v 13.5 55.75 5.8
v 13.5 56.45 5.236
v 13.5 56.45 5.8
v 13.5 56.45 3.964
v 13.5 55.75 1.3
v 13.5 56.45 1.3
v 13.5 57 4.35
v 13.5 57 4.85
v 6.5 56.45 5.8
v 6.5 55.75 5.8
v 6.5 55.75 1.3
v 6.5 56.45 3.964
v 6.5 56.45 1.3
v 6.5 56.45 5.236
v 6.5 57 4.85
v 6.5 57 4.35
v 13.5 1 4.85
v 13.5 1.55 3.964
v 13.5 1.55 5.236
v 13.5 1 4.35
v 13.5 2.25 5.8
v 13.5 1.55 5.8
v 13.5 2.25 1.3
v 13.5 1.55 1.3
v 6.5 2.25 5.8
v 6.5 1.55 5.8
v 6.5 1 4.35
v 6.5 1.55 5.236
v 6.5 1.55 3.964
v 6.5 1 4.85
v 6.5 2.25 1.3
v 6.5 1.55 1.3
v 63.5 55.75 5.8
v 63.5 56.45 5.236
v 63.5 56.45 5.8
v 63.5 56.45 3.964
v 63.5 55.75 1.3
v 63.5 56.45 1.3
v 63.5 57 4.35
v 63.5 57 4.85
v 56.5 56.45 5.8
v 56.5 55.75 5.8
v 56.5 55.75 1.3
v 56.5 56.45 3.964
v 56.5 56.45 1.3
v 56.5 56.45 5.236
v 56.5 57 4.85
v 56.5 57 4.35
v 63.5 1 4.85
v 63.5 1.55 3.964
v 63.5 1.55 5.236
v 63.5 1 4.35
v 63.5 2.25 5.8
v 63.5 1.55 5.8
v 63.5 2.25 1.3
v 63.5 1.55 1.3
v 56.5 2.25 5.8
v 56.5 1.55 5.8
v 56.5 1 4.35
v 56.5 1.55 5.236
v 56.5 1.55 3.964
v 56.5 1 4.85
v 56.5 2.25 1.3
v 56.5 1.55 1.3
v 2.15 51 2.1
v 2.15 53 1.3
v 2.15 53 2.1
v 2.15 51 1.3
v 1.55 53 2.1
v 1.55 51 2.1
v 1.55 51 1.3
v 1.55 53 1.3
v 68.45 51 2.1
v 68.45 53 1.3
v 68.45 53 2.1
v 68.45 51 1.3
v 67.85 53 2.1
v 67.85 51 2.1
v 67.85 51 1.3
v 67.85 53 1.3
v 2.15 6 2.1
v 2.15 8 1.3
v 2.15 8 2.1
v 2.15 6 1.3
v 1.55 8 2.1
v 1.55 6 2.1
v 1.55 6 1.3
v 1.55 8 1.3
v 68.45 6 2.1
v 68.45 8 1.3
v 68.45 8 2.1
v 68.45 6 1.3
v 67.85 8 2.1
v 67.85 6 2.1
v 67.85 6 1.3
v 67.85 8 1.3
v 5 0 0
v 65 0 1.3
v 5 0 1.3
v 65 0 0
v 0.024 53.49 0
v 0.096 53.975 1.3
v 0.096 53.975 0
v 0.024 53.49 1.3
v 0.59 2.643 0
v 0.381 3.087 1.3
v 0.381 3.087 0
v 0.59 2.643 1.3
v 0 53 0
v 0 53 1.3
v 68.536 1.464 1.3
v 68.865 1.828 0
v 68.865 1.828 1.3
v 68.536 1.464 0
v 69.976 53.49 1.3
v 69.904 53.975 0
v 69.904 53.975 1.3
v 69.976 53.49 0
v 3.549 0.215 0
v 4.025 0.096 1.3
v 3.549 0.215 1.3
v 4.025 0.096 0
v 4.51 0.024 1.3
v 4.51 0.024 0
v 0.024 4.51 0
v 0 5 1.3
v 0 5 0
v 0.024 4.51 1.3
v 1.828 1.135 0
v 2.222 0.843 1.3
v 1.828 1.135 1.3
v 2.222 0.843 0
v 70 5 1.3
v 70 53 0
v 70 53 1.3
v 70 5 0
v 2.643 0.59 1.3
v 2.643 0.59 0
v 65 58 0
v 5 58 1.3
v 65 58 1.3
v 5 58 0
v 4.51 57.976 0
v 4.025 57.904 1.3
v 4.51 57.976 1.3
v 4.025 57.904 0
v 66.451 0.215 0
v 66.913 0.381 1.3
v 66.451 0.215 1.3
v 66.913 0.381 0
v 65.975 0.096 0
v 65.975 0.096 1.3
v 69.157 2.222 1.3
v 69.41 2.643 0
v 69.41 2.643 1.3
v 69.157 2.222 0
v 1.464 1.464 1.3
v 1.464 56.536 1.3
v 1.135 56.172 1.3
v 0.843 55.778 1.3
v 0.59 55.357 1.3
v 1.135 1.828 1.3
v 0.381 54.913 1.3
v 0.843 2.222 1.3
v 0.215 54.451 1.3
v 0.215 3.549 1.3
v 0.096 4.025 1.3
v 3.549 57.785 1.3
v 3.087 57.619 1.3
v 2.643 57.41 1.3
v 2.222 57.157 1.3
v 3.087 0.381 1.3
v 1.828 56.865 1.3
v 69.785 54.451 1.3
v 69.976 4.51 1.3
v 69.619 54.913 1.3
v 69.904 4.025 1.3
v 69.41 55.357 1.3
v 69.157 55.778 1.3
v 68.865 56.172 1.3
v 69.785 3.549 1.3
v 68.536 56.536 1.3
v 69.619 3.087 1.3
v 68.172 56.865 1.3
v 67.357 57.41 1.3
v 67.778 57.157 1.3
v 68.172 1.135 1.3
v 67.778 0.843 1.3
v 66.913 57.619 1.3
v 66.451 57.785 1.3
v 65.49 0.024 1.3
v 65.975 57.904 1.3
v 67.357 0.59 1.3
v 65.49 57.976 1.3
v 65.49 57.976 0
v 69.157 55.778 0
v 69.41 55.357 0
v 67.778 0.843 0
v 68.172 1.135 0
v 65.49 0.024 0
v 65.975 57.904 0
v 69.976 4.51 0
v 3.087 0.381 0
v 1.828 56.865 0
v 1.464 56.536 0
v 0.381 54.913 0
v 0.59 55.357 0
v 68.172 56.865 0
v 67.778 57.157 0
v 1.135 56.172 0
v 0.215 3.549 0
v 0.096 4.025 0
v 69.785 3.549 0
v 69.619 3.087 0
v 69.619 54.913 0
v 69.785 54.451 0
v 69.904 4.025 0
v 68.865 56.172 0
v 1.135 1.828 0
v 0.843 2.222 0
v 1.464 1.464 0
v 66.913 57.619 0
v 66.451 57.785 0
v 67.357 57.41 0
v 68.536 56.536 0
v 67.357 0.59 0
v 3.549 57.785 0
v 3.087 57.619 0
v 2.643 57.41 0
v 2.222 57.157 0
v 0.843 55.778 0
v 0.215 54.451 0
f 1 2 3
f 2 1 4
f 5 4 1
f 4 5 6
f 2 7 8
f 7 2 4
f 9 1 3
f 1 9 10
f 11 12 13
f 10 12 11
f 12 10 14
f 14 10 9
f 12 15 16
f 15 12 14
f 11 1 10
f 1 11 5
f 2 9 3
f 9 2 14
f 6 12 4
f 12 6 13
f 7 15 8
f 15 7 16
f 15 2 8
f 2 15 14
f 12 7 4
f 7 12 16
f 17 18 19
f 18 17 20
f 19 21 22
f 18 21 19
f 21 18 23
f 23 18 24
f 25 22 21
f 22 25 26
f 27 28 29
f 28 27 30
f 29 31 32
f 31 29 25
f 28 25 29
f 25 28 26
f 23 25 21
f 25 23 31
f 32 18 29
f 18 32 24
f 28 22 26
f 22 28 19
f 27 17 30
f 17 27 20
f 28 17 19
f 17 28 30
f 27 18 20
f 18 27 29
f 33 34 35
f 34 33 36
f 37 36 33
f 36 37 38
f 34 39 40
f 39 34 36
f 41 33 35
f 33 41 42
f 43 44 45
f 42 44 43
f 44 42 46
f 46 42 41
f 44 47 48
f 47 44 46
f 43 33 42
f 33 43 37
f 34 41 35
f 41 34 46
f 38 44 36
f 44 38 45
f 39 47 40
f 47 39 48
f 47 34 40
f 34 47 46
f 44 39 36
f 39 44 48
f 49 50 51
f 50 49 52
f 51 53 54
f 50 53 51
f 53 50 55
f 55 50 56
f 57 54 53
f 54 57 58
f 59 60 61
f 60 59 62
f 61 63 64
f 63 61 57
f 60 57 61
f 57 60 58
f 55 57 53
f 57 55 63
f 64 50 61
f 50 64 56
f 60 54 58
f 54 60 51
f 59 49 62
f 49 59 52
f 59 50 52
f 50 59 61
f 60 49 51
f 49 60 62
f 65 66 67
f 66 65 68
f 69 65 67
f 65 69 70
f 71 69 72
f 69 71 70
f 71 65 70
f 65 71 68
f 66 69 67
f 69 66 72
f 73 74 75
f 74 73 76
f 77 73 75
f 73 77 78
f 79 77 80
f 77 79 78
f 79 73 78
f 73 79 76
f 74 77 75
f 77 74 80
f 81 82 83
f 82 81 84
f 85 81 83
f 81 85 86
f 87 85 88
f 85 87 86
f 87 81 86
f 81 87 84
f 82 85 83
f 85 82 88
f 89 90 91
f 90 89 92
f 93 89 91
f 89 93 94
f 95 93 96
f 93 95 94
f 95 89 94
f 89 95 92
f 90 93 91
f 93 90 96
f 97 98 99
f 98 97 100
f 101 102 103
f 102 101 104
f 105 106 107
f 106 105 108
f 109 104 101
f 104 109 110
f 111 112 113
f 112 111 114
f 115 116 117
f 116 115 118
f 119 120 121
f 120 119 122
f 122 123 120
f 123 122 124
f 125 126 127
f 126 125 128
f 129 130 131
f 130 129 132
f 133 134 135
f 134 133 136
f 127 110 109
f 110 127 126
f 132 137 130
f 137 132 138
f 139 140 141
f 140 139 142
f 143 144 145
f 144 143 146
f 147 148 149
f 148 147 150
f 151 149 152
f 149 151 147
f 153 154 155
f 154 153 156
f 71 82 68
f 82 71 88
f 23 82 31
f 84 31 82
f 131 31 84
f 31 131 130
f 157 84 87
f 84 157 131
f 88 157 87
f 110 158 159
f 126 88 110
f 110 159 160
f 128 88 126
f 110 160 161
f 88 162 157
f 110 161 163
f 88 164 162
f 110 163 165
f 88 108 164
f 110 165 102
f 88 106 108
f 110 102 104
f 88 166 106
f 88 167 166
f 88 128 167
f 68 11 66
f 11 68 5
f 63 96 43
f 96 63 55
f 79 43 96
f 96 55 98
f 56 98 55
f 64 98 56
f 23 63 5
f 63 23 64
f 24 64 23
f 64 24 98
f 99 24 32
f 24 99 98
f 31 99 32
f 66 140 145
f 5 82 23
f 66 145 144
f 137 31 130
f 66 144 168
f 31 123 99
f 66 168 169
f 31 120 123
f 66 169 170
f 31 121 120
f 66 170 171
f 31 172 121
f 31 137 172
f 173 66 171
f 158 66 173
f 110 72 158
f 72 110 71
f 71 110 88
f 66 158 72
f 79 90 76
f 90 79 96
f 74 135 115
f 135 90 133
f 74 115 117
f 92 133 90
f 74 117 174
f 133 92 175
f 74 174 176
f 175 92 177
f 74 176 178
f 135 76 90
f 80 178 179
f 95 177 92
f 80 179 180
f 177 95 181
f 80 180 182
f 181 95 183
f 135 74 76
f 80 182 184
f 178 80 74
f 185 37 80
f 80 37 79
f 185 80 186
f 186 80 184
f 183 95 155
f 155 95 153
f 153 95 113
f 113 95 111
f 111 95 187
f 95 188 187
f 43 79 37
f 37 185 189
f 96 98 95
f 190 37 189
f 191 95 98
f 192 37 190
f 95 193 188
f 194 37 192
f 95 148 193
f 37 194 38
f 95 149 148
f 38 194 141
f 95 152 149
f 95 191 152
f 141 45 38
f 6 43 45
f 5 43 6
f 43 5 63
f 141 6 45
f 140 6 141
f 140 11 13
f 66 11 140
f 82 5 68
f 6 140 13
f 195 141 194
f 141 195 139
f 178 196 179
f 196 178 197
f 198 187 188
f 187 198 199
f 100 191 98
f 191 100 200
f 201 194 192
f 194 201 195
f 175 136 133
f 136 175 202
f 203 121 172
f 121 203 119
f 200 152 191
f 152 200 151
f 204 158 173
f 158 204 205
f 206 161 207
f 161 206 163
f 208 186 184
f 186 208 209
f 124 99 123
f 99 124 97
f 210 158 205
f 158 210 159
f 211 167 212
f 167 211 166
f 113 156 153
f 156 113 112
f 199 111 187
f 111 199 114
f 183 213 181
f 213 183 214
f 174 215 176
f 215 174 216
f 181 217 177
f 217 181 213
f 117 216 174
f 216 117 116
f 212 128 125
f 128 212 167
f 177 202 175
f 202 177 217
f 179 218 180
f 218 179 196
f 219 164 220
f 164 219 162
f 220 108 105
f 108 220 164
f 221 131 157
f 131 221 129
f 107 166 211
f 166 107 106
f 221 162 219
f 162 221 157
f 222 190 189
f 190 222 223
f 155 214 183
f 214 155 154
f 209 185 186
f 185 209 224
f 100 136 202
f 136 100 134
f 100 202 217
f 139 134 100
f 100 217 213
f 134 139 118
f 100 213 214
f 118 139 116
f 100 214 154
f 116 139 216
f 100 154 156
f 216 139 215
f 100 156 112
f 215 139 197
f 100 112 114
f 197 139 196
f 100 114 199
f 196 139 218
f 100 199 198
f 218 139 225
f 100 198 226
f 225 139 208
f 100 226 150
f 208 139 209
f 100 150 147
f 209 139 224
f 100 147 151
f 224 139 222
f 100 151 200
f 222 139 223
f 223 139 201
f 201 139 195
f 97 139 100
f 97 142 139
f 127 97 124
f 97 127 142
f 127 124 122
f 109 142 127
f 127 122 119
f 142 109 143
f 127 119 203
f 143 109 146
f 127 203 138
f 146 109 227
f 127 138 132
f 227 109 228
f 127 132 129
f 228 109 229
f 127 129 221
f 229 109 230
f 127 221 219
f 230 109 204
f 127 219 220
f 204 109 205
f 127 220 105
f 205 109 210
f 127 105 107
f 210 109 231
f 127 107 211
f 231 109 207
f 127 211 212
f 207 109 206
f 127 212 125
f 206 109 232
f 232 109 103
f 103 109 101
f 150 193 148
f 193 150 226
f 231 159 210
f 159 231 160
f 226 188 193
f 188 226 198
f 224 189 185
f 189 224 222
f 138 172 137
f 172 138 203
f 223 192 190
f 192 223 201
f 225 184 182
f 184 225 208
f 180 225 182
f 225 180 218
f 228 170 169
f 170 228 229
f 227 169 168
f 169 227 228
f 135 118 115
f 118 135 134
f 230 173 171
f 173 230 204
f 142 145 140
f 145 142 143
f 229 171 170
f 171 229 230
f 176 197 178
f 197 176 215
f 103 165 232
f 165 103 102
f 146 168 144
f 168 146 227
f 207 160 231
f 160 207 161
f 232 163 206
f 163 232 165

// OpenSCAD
// Spine Smart v3 — revised prototype for stage I.
// Nominal component envelopes from Sizes-1.pdf, not measured purchased parts.
// Units: mm. Print bottom and lid separately; do not print assembled view.
$fn=64;
mode=2; // 0 assembled, 1 bottom, 2 lid on bed, 3 exploded, 4 component plan
L=70; W=58; H=9.6;
wall=1.3; floor_t=1.3; lid_t=1.3; base_h=H-lid_t; corner=5;
clip_x=[10,60]; clip_width=7; clip_t=0.7; clip_gap=0.25;
clip_length=4.5; catch_depth=0.30;
// Adjustable connector openings: verify alignment with actual modules.
charge_x=41.75; esp_usb_x=41; usb_width=12; usb_height=5; usb_z=2.0;
switch_x=18; switch_slot_w=11; switch_slot_h=3.5; switch_z=3.0;

module rounded_box(l,w,h,r) {
    linear_extrude(height=h)
        hull() for(x=[r,l-r],y=[r,w-r]) translate([x,y]) circle(r=r);
}

module board_seat(x,y,w,l,front_open=false,back_open=false) {
    // Adhesive seat, not an unverified screw-hole pattern.
    translate([x,y,floor_t-0.02]) cube([w,l,0.62]);
    translate([x-0.65,y+2,floor_t-0.02]) cube([0.55,l-4,1.22]);
    translate([x+w+0.1,y+2,floor_t-0.02]) cube([0.55,l-4,1.22]);
    if(!front_open) translate([x+2,y-0.65,floor_t-0.02]) cube([w-4,0.55,1.22]);
    if(!back_open) translate([x+2,y+l+0.1,floor_t-0.02]) cube([w-4,0.55,1.22]);
}

module bottom() {
    union() {
        difference() {
            union() {
                rounded_box(L,W,base_h,corner);
                // Closed strap loops: through holes along Z, linked at both ends.
                translate([-5,(W-34)/2,0]) rounded_box(6.1,34,base_h,1.1);
                translate([L-1.1,(W-34)/2,0]) rounded_box(6.1,34,base_h,1.1);
            }
            translate([wall,wall,floor_t])
                rounded_box(L-2*wall,W-2*wall,base_h+0.2,corner-wall);
            translate([-3.6,(W-26)/2,-0.1]) cube([2.8,26,base_h+0.2]);
            translate([L+0.8,(W-26)/2,-0.1]) cube([2.8,26,base_h+0.2]);
            // Four local snap pockets; solid wall above each pocket.
            for(xx=clip_x) {
                translate([xx-3.8,wall-0.45,base_h-4.0]) cube([7.6,0.75,1.4]);
                translate([xx-3.8,W-wall-0.30,base_h-4.0]) cube([7.6,0.75,1.4]);
            }
            // Charging USB-C and programming USB-C, on opposite ends.
            translate([charge_x-usb_width/2,-0.1,usb_z]) cube([usb_width,wall+0.2,usb_height]);
            translate([esp_usb_x-usb_width/2,W-wall-0.1,usb_z]) cube([usb_width,wall+0.2,usb_height]);
            // Switch actuator opening. Tune to the actual purchased switch.
            translate([switch_x,W-wall-0.1,switch_z]) cube([switch_slot_w,wall+0.2,switch_slot_h]);
            // Nail recess, away from ports, under the lid edge.
            translate([17,W-wall-0.1,base_h-0.8]) cube([9,wall+0.2,1.0]);
        }
        // Battery / electronics separator; end gaps allow wires around it.
        translate([29.2,8,floor_t-0.02]) cube([1.2,40,base_h-floor_t-0.6]);
        // Battery locating stops; mounting with a thin adhesive strip.
        translate([2.2,11,floor_t-0.02]) cube([0.6,35,0.82]);
        translate([3,10.2,floor_t-0.02]) cube([25,0.6,0.82]);
        translate([3,46.2,floor_t-0.02]) cube([25,0.6,0.82]);
        board_seat(33,2,17.5,28,true,false); // TP4056, connector faces front
        board_seat(32,32.8,18,22.5,false,true); // ESP32-C3, USB faces rear
        board_seat(51,33,16,21); // MPU6050, direct soldering, no pin headers
        // Coin motor locator. Inner diameter allows a nominal 10 mm motor.
        translate([59,16,floor_t-0.02]) difference() {
            cylinder(d=12,h=1.02);
            translate([0,0,-0.1]) cylinder(d=10.6,h=1.3);
        }
        // Free mounting seats for driver passives and switch.
        translate([53,24,floor_t-0.02]) cube([13,6,0.62]);
        translate([17,49.5,floor_t-0.02]) cube([13,6.5,0.62]);
    }
}

module front_clip(xx) {
    translate([xx-clip_width/2,wall+clip_gap,-clip_length])
        cube([clip_width,clip_t,clip_length+0.04]);
    // Symmetric ramps allow both closing and deliberate reopening.
    translate([xx-clip_width/2,0,0]) rotate([90,0,90])
        linear_extrude(height=clip_width)
            polygon([[wall+clip_gap+0.02,-3.95],
                     [wall-catch_depth,-3.55],
                     [wall-catch_depth,-3.05],
                     [wall+clip_gap+0.02,-2.65]]);
}

module lid() {
    union() {
        rounded_box(L,W,lid_t,corner);
        for(xx=clip_x) {
            front_clip(xx);
            translate([0,W,0]) mirror([0,1,0]) front_clip(xx);
        }
        // Small guides in clear side margins, away from battery and boards.
        for(yy=[6,51]) {
            translate([wall+0.25,yy-1,-0.8]) cube([0.6,2,0.84]);
            translate([L-wall-0.85,yy-1,-0.8]) cube([0.6,2,0.84]);
        }
    }
}

module components() {
    // Heights represent full nominal module envelopes, not just PCB thickness.
    color("orange") translate([3,11,floor_t+0.2]) cube([25,35,6]);
    color("teal") translate([33,2,floor_t+0.8]) cube([17.5,28,4]);
    color("royalblue") translate([32,32.8,floor_t+0.8]) cube([18,22.5,3.8]);
    color("purple") translate([51,33,floor_t+0.8]) cube([16,21,2.8]);
    color("hotpink") translate([59,16,floor_t+0.2]) cylinder(d=10,h=3);
    // Switch outline is an allocation only: it must be measured.
    color("gray") translate([17.5,50,floor_t+0.8]) cube([12,6,5]);
}

if(mode==0) {
    color([0.2,0.35,0.45]) bottom();
    color([0.45,0.6,0.7]) translate([0,0,base_h]) lid();
} else if(mode==1) bottom();
else if(mode==2) translate([0,W,lid_t]) rotate([180,0,0]) lid();
else if(mode==3) {
    color([0.2,0.35,0.45,0.65]) bottom();
    components();
    color([0.45,0.6,0.7,0.8]) translate([0,0,base_h+16]) lid();
} else if(mode==4) {
    color([0.2,0.35,0.45,0.35]) bottom();
    components();
}
